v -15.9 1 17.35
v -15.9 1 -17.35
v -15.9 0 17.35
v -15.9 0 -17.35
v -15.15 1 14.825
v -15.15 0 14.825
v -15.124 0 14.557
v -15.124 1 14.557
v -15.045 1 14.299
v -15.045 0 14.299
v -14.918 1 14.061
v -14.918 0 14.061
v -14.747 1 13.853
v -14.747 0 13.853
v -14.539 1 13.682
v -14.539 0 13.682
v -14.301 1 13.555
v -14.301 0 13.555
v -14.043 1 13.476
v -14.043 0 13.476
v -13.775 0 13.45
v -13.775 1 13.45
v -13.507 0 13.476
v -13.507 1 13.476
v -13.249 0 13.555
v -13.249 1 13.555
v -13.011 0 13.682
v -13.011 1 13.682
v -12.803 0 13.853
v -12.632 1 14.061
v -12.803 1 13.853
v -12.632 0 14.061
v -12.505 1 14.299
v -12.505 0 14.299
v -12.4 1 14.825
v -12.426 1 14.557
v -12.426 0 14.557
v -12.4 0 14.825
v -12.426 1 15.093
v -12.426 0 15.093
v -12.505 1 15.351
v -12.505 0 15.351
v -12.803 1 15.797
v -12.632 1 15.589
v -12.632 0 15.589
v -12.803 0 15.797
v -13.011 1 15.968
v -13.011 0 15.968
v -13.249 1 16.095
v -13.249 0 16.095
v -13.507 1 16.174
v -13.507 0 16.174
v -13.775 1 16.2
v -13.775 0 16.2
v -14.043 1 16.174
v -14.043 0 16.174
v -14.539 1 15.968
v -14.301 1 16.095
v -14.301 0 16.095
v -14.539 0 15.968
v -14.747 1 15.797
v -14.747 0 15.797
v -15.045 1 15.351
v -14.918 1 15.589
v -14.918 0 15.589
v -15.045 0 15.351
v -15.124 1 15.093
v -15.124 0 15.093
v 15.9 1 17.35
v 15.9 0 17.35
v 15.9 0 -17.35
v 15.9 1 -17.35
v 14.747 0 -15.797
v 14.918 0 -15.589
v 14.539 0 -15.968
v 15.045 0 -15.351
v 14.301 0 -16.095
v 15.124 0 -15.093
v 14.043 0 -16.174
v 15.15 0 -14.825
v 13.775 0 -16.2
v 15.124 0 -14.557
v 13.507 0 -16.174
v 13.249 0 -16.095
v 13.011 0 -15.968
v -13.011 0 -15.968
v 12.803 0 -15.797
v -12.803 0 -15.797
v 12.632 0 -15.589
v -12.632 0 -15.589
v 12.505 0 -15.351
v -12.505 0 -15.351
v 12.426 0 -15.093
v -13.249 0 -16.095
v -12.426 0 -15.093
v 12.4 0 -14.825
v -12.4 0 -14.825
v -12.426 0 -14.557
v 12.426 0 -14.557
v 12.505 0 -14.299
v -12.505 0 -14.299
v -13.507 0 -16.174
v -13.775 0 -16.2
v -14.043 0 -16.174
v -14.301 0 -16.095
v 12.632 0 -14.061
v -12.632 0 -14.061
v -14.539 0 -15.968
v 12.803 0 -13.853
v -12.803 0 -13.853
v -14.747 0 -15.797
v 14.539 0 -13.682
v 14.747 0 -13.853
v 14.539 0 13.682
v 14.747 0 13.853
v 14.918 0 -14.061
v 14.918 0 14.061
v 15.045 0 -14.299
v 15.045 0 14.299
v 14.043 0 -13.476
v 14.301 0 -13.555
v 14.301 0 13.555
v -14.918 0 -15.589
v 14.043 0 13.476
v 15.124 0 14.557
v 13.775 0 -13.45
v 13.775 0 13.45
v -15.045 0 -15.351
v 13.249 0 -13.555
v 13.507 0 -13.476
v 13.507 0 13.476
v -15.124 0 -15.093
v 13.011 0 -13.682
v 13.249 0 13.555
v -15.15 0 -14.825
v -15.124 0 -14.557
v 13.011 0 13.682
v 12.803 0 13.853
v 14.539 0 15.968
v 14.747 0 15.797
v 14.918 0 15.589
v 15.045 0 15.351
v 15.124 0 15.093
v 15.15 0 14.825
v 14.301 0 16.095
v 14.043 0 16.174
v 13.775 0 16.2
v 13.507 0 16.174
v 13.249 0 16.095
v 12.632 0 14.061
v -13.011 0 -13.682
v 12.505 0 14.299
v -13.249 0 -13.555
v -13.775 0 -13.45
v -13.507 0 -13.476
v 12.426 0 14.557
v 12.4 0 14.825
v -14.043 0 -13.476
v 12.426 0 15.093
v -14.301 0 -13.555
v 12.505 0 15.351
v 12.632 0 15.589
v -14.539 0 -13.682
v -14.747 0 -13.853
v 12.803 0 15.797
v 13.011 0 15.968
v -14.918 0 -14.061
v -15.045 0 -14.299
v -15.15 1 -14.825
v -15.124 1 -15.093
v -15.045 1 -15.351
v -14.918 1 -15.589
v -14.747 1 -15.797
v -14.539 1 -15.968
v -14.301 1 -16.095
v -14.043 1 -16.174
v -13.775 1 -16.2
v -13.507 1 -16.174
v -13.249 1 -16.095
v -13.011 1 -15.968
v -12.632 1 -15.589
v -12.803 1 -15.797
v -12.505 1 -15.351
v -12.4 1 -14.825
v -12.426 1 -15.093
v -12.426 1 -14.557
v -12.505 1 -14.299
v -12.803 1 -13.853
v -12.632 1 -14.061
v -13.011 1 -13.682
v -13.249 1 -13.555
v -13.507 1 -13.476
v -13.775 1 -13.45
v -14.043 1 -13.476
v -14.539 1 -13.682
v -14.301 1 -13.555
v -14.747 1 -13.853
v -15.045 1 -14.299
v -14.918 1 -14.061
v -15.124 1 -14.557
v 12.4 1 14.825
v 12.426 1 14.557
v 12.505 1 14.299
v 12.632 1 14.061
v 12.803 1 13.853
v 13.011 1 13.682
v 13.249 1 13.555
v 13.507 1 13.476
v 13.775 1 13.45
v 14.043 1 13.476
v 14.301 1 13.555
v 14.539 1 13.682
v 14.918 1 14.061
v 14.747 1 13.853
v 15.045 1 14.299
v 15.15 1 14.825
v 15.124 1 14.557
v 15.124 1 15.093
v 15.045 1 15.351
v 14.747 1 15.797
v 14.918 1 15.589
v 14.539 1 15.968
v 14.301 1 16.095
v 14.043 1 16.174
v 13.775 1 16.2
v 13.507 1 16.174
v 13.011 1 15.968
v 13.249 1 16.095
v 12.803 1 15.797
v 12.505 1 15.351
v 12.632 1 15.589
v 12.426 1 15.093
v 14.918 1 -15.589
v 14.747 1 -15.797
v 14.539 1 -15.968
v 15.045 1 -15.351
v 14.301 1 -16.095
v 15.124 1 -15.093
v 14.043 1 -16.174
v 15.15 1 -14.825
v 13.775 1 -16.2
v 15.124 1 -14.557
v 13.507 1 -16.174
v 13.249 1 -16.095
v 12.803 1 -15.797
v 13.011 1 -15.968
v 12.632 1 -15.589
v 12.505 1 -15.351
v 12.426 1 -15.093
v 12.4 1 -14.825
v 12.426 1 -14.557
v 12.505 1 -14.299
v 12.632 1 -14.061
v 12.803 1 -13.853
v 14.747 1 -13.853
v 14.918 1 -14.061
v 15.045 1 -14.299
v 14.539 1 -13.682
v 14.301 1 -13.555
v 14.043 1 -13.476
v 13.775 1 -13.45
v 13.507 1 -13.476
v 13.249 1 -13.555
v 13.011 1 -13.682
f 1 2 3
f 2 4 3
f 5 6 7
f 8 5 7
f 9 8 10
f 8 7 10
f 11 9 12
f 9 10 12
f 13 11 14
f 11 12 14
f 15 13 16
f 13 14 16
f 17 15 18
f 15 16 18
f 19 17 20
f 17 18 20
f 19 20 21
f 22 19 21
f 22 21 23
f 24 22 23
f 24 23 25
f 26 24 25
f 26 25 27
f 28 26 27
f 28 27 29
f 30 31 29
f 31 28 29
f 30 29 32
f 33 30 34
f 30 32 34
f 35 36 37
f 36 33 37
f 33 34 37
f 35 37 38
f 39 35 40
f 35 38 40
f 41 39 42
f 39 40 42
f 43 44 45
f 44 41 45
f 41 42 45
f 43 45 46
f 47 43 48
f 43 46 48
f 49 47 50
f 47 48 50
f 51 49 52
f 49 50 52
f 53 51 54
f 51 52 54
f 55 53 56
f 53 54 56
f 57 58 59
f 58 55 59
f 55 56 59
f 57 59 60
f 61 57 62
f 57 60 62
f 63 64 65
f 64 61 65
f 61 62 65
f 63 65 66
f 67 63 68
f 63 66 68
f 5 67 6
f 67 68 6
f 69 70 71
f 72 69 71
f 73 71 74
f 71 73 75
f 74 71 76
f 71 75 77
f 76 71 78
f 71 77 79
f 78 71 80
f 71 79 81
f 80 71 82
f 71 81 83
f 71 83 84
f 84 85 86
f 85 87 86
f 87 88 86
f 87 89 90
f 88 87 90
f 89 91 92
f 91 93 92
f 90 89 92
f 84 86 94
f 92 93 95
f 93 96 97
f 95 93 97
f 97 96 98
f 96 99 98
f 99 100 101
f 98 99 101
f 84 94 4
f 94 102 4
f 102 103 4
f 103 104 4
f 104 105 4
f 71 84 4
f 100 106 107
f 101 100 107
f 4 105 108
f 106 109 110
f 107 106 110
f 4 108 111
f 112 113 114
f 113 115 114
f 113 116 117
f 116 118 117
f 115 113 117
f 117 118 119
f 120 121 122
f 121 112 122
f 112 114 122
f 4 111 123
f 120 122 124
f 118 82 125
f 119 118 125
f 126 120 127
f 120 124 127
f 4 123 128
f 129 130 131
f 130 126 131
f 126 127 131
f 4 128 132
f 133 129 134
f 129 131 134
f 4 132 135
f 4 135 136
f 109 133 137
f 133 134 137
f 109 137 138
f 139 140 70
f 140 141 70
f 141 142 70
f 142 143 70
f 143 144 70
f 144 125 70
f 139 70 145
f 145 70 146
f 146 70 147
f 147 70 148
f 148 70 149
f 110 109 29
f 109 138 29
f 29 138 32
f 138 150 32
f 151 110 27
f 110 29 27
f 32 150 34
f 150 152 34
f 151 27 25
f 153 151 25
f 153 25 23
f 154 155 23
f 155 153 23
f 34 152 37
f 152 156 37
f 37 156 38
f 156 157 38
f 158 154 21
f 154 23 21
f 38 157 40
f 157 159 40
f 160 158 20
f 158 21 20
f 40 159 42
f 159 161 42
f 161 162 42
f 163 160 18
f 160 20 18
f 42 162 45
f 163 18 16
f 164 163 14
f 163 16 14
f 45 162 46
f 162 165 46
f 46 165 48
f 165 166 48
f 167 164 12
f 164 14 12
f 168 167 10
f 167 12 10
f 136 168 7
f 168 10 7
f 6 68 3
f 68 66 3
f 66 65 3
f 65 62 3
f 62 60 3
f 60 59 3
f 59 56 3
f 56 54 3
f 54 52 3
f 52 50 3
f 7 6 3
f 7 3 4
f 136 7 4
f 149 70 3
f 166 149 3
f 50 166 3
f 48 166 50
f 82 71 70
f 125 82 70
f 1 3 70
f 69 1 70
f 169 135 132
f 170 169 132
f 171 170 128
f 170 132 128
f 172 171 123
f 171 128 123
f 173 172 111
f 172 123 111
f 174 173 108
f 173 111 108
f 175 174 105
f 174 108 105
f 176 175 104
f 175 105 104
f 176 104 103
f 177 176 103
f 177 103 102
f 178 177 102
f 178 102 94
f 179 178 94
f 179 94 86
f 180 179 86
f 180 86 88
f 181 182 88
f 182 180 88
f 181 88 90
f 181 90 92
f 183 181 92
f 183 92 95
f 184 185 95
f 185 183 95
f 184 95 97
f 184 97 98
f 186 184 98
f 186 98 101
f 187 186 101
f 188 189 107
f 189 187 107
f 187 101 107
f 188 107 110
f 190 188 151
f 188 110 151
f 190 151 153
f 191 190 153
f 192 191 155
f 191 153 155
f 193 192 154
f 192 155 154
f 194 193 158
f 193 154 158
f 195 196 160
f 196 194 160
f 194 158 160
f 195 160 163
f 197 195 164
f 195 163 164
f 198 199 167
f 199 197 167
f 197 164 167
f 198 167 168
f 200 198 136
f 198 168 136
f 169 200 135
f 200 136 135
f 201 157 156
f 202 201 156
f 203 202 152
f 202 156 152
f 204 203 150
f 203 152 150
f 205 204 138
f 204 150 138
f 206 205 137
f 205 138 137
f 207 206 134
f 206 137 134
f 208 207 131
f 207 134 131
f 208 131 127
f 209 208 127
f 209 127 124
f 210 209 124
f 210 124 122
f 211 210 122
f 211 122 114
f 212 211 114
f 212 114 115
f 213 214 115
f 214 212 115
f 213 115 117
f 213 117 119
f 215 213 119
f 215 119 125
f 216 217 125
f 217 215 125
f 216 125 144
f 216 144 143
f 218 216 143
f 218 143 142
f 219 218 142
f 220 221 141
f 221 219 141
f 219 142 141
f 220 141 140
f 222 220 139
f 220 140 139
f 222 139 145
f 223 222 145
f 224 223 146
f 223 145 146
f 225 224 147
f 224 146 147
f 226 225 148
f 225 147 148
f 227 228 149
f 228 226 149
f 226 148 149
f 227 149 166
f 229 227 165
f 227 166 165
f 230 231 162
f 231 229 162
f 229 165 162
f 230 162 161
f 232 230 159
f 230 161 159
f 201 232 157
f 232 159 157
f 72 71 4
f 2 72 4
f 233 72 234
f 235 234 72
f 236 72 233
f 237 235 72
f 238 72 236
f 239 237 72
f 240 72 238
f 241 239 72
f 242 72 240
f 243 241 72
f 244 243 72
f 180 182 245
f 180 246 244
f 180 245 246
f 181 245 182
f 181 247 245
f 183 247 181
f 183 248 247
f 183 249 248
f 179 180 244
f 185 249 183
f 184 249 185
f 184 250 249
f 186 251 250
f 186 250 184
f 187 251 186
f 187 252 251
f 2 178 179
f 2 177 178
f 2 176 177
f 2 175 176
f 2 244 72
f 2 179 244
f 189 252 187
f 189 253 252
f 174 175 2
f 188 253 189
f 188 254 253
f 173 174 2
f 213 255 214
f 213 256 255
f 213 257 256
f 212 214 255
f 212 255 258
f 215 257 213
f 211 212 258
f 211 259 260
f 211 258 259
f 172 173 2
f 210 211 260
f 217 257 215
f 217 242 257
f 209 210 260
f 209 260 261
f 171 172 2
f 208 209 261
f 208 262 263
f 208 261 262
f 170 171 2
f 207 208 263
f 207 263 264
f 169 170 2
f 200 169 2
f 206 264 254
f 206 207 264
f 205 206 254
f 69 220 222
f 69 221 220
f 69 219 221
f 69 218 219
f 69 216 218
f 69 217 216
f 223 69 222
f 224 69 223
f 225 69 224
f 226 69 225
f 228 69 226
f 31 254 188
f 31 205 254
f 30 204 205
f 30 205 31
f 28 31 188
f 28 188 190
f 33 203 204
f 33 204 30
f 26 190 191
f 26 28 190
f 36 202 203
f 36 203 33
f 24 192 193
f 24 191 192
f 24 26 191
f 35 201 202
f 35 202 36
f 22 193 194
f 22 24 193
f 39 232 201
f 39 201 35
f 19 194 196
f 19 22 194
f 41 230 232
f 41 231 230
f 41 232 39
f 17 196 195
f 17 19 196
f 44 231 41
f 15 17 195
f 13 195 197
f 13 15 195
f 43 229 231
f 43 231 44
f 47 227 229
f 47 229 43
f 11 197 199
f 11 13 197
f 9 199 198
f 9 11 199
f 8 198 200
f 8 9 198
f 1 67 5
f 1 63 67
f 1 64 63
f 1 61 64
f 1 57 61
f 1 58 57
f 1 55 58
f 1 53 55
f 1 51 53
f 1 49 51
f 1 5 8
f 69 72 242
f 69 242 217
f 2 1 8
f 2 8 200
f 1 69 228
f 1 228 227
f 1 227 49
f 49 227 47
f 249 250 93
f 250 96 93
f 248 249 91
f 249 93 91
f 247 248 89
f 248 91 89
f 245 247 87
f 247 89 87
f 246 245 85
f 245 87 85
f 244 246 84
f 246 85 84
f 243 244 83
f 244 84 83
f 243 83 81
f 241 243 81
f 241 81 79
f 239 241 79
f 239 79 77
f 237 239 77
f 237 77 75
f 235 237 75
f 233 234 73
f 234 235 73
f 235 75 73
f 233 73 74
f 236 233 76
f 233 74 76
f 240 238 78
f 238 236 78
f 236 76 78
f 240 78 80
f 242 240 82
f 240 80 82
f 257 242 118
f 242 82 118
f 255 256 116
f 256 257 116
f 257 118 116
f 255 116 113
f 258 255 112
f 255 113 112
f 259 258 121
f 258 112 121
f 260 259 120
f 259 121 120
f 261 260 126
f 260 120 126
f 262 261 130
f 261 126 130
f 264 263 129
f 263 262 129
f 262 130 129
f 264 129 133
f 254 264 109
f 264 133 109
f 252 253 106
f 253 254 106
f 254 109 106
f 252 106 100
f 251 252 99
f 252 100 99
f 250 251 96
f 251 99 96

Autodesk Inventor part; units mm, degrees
ref_plane "YZ Plane" through (0, 0, 0) normal (1, 0, 0) x (0, 1, 0)
ref_plane "XZ Plane" through (0, 0, 0) normal (0, 1, 0) x (-1, 0, 0)
ref_plane "XY Plane" through (0, 0, 0) normal (0, 0, 1) x (1, 0, 0)
sketch "Sketch1" plane through (0, 0, 0) normal (0, 1, 0) x (-1, 0, 0)
  line L0 (15.9, 17.35) -> (-15.9, 17.35)
  line L1 (-15.9, 17.35) -> (-15.9, -17.35)
  line L2 (-15.9, -17.35) -> (15.9, -17.35)
  line L3 (15.9, -17.35) -> (15.9, 17.35)
  line L4 (15.9, 17.35) -> (-15.9, -17.35) construction
  line L5 (-15.9, 17.35) -> (15.9, -17.35) construction
  circle A0 centre (13.775, 14.825) radius 1.375
  line L6 (0, 17.35) -> (0, -17.35) construction
  line L7 (15.9, 0) -> (-15.9, 0) construction
  circle A1 centre (13.775, -14.825) radius 1.375
  circle A2 centre (-13.775, 14.825) radius 1.375
  circle A3 centre (-13.775, -14.825) radius 1.375
  point P0 (0, 0)
  dimension "d0" = 31.8
  dimension "d1" = 34.7
  dimension "d2" = 2.75
  dimension "d3" = 2.125
  dimension "d4" = 2.525
extrude "Extrusion1" add sketch "Sketch1" along normal blind 1
properties part number "motordriver_footprint"
